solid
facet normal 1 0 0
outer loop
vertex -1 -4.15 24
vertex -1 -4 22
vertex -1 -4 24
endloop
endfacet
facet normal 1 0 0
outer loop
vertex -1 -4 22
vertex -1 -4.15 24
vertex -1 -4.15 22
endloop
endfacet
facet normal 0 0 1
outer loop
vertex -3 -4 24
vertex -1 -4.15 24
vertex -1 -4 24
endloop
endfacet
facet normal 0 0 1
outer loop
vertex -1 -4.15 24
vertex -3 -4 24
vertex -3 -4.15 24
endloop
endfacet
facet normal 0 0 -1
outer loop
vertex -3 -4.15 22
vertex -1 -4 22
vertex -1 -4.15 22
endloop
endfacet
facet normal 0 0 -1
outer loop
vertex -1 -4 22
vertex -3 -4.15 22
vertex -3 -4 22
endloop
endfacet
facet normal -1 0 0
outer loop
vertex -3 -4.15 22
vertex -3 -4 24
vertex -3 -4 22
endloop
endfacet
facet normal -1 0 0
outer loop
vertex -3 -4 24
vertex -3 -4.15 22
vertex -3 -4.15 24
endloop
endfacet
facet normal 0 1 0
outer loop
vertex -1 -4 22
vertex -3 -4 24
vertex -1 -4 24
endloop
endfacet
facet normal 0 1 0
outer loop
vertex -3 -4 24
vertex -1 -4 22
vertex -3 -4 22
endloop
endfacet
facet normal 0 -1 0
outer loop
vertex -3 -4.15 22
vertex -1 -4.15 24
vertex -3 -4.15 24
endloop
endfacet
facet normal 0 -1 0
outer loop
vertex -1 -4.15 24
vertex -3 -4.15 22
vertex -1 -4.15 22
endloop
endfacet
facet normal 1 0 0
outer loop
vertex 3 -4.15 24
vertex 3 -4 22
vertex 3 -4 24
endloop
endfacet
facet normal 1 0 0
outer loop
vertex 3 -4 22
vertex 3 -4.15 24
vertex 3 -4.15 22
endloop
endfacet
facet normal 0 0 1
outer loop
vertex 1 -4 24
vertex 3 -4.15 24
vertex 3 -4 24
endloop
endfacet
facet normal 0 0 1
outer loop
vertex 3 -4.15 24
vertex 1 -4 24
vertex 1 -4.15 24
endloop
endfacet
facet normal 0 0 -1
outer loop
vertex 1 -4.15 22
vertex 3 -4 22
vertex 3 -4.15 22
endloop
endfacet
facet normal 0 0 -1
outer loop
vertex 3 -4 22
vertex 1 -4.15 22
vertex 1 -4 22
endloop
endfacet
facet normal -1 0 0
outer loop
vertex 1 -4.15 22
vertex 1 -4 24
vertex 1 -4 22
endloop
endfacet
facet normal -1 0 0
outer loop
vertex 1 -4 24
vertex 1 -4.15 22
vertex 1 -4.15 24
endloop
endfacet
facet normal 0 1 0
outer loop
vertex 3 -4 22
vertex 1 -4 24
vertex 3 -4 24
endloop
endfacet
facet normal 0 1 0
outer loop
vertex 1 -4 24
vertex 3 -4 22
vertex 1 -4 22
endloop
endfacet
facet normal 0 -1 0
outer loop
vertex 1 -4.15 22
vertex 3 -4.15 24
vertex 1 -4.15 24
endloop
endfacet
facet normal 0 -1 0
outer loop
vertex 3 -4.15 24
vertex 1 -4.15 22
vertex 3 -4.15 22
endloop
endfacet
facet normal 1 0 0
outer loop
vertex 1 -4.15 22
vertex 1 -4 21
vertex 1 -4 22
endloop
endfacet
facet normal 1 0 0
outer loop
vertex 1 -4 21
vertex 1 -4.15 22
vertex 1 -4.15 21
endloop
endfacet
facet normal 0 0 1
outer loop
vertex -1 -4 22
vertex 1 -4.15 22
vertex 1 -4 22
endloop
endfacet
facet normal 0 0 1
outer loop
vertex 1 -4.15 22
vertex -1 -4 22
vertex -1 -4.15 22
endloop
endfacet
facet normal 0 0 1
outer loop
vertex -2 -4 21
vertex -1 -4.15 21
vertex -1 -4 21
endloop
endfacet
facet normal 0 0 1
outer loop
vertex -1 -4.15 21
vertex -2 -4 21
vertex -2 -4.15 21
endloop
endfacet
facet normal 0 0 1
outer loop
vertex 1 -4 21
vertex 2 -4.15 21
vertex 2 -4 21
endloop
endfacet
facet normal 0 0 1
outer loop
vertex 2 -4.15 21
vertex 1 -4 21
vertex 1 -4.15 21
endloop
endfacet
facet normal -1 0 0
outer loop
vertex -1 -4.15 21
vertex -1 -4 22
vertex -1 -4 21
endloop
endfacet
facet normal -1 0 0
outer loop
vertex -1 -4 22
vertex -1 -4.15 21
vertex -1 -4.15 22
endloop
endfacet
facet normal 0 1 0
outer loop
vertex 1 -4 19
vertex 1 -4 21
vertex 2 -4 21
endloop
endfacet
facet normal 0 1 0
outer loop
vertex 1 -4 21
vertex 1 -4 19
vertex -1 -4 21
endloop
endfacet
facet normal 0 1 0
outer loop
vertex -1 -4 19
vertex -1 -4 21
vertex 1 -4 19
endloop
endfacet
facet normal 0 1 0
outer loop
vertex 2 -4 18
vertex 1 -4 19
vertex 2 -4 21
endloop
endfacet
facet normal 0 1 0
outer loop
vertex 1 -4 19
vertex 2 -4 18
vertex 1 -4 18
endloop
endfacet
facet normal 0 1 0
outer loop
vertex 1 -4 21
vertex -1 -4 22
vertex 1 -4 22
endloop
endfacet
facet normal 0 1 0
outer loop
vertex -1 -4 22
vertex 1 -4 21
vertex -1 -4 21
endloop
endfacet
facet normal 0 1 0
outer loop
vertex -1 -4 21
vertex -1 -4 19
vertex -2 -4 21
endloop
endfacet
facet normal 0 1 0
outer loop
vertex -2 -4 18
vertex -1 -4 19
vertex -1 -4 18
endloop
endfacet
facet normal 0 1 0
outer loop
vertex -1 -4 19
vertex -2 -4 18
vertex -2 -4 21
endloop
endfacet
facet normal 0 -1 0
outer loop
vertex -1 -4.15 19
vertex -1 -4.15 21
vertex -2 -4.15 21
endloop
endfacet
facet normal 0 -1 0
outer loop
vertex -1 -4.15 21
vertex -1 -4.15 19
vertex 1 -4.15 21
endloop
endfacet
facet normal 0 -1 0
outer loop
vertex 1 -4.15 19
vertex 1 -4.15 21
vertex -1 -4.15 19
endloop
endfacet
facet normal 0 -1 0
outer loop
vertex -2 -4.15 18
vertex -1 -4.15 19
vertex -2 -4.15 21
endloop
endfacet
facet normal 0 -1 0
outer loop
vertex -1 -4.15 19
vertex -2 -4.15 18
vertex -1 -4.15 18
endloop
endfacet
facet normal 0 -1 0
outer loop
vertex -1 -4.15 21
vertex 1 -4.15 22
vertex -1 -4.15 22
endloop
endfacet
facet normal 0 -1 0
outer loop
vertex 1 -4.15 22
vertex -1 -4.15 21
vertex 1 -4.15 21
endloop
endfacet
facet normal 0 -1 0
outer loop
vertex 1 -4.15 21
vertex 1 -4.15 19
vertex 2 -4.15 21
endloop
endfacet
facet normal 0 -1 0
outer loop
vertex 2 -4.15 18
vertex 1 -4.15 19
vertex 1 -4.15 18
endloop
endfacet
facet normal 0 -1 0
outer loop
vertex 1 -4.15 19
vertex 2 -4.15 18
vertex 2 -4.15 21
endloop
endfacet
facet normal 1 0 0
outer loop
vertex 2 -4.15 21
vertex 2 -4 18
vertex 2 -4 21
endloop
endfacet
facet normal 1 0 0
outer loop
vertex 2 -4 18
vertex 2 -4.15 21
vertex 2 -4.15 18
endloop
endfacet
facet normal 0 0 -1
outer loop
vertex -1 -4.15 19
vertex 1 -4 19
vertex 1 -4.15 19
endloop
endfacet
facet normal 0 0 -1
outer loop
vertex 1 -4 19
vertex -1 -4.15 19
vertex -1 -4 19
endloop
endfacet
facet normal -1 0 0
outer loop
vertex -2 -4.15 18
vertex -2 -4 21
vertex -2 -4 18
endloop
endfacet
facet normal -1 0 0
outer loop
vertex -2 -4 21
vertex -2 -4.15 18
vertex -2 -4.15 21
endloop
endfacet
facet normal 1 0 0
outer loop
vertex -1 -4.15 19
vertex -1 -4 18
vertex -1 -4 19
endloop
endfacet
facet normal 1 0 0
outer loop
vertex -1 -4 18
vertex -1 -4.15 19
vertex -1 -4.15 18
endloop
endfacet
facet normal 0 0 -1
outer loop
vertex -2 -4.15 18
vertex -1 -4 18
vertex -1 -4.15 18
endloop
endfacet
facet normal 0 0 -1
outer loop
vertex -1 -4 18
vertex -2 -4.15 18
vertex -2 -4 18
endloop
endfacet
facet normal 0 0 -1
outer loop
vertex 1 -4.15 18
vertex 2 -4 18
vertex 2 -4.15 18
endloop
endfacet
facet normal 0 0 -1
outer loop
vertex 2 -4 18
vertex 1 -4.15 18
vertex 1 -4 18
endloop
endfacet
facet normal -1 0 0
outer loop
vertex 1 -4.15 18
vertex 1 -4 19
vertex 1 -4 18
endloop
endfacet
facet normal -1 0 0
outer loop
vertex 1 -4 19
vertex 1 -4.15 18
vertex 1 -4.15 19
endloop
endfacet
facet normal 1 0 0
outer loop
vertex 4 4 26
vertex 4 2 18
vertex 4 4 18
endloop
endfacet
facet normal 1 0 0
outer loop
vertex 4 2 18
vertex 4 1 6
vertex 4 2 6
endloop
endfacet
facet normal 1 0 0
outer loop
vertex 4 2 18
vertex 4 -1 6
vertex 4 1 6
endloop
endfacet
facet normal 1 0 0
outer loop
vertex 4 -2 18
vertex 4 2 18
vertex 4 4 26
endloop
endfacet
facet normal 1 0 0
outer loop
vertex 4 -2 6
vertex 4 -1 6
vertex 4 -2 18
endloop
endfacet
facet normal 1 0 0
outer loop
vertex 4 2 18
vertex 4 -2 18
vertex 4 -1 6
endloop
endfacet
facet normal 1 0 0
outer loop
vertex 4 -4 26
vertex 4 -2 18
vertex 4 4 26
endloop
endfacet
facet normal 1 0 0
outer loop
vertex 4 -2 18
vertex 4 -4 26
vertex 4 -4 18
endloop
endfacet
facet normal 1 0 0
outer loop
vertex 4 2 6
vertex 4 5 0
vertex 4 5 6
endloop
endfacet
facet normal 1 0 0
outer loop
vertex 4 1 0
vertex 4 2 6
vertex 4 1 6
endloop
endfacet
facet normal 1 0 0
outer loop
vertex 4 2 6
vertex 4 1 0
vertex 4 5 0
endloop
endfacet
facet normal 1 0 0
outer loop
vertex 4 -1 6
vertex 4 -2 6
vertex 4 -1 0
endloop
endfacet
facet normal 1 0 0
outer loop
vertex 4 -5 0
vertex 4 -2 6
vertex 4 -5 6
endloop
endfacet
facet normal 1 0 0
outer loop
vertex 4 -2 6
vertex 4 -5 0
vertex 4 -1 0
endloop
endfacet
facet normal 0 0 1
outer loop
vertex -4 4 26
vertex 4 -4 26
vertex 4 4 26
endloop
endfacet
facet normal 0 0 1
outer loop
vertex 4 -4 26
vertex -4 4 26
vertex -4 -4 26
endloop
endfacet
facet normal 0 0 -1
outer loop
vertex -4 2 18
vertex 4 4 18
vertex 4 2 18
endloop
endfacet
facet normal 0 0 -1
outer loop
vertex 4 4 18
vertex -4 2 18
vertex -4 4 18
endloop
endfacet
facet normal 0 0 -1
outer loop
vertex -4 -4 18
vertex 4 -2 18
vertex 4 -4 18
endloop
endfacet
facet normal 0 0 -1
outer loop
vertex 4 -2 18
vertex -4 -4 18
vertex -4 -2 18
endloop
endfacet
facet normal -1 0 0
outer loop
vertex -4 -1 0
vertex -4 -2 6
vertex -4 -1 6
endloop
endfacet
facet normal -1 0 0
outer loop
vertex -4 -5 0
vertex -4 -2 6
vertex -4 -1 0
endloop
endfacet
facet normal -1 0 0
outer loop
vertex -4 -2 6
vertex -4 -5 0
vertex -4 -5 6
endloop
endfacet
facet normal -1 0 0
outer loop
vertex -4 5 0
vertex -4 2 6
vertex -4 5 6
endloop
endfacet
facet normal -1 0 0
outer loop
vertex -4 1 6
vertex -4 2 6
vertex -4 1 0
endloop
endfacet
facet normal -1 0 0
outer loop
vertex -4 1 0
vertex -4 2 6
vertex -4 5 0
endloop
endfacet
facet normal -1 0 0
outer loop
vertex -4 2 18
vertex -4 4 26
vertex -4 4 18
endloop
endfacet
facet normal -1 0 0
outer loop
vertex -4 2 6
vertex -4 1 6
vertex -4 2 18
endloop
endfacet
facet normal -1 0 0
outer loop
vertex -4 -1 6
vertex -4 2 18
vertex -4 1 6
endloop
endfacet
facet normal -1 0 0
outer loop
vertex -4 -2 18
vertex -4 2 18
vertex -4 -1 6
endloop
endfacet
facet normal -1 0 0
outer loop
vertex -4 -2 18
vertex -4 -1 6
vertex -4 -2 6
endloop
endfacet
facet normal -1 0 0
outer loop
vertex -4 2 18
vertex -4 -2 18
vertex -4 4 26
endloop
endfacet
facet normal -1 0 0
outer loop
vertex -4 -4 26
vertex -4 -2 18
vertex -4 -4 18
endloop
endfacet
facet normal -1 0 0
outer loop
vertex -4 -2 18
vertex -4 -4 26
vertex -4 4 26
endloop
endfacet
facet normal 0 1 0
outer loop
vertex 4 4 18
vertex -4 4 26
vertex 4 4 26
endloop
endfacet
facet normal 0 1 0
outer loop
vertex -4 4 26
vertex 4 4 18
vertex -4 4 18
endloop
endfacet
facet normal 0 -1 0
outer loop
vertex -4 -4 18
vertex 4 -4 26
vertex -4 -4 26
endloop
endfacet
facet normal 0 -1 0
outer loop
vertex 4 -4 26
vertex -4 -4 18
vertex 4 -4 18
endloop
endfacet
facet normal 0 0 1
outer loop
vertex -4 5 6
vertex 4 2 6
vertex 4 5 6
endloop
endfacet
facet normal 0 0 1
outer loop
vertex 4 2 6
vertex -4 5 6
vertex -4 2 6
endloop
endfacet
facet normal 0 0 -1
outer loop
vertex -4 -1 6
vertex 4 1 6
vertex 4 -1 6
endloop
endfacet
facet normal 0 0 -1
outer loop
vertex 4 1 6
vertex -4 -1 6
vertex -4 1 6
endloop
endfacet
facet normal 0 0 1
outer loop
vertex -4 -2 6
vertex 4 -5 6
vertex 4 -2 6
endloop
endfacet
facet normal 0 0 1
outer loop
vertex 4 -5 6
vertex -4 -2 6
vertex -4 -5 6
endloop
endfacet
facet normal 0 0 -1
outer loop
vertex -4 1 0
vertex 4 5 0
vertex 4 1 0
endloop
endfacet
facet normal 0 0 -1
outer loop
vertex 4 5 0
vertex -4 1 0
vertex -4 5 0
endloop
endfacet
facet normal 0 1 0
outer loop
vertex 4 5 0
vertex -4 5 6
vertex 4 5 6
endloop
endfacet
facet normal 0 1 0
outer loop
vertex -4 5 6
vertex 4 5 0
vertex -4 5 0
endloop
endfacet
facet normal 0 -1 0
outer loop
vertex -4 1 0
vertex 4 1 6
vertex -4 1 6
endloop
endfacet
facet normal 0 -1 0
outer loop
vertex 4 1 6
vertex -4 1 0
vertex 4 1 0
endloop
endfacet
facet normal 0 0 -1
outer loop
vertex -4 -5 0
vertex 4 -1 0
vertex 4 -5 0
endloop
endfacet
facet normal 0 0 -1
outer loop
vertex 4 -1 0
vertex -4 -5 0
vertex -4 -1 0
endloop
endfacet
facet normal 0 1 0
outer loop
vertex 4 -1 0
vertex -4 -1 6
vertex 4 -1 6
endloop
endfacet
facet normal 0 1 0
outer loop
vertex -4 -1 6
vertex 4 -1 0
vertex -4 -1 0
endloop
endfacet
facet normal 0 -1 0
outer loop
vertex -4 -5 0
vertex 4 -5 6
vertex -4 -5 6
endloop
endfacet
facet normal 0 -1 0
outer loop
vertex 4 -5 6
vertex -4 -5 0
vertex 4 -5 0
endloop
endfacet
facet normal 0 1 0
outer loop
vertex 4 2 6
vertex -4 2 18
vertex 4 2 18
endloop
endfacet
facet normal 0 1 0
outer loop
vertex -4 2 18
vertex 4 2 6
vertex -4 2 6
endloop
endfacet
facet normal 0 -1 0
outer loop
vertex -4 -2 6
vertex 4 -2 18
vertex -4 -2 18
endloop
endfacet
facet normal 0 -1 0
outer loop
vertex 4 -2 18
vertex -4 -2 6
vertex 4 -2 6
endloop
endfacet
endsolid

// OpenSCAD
// Minecraft Creeper 3D Model - Precision Proportion Adjustment

// --- Parameters ---
block_size = 1; 

head_dim = 8 * block_size;
body_w = 8 * block_size; // Explicitly matches head X extent
body_h = 12 * block_size;
body_d = 4 * block_size; // Substantial "slab" depth

leg_w = 4 * block_size;
leg_h = 6 * block_size;
leg_d = 4 * block_size;

// Colors
color_green = [0.3, 0.6, 0.2]; 
color_black = [0.1, 0.1, 0.1];

// --- Modules ---

module head() {
    union() {
        color(color_green)
        cube([head_dim, head_dim, head_dim], center=true);
        
        face_thickness = 0.15 * block_size;
        face_y_offset = -head_dim/2 - (face_thickness / 2);

        color(color_black)
        translate([0, face_y_offset, 0]) {
            translate([-2 * block_size, 0, 1 * block_size]) 
                cube([2 * block_size, face_thickness, 2 * block_size], center=true);
            translate([2 * block_size, 0, 1 * block_size]) 
                cube([2 * block_size, face_thickness, 2 * block_size], center=true);
            translate([0, 0, -0.5 * block_size]) 
                cube([2 * block_size, face_thickness, 1 * block_size], center=true);
            translate([0, 0, -2 * block_size]) 
                cube([4 * block_size, face_thickness, 2 * block_size], center=true);
            translate([-1.5 * block_size, 0, -3 * block_size]) 
                cube([1 * block_size, face_thickness, 2 * block_size], center=true);
            translate([1.5 * block_size, 0, -3 * block_size]) 
                cube([1 * block_size, face_thickness, 2 * block_size], center=true);
        }
    }
}

module body() {
    color(color_green)
    cube([body_w, body_d, body_h], center=true);
}

module leg() {
    color(color_green)
    cube([leg_w, leg_d, leg_h], center=true);
}

// --- Assembly ---

// "Barely intersect":
// The leg's inner edge should be almost at the body's outer edge.
// Body edge = body_d / 2 = 2.
// Leg inner edge = leg_y_offset - (leg_d / 2).
// To overlap more for 3D printability
overlap = 1.0 * block_size;
leg_y_offset = (body_d / 2) + (leg_d / 2) - overlap;

// Front row
translate([-leg_w/2,  leg_y_offset, leg_h/2]) leg(); 
translate([ leg_w/2,  leg_y_offset, leg_h/2]) leg(); 

// Back row
translate([-leg_w/2, -leg_y_offset, leg_h/2]) leg(); 
translate([ leg_w/2, -leg_y_offset, leg_h/2]) leg(); 

// Body
translate([0, 0, leg_h + body_h/2]) body();

// Head
translate([0, 0, leg_h + body_h + head_dim/2]) head();
